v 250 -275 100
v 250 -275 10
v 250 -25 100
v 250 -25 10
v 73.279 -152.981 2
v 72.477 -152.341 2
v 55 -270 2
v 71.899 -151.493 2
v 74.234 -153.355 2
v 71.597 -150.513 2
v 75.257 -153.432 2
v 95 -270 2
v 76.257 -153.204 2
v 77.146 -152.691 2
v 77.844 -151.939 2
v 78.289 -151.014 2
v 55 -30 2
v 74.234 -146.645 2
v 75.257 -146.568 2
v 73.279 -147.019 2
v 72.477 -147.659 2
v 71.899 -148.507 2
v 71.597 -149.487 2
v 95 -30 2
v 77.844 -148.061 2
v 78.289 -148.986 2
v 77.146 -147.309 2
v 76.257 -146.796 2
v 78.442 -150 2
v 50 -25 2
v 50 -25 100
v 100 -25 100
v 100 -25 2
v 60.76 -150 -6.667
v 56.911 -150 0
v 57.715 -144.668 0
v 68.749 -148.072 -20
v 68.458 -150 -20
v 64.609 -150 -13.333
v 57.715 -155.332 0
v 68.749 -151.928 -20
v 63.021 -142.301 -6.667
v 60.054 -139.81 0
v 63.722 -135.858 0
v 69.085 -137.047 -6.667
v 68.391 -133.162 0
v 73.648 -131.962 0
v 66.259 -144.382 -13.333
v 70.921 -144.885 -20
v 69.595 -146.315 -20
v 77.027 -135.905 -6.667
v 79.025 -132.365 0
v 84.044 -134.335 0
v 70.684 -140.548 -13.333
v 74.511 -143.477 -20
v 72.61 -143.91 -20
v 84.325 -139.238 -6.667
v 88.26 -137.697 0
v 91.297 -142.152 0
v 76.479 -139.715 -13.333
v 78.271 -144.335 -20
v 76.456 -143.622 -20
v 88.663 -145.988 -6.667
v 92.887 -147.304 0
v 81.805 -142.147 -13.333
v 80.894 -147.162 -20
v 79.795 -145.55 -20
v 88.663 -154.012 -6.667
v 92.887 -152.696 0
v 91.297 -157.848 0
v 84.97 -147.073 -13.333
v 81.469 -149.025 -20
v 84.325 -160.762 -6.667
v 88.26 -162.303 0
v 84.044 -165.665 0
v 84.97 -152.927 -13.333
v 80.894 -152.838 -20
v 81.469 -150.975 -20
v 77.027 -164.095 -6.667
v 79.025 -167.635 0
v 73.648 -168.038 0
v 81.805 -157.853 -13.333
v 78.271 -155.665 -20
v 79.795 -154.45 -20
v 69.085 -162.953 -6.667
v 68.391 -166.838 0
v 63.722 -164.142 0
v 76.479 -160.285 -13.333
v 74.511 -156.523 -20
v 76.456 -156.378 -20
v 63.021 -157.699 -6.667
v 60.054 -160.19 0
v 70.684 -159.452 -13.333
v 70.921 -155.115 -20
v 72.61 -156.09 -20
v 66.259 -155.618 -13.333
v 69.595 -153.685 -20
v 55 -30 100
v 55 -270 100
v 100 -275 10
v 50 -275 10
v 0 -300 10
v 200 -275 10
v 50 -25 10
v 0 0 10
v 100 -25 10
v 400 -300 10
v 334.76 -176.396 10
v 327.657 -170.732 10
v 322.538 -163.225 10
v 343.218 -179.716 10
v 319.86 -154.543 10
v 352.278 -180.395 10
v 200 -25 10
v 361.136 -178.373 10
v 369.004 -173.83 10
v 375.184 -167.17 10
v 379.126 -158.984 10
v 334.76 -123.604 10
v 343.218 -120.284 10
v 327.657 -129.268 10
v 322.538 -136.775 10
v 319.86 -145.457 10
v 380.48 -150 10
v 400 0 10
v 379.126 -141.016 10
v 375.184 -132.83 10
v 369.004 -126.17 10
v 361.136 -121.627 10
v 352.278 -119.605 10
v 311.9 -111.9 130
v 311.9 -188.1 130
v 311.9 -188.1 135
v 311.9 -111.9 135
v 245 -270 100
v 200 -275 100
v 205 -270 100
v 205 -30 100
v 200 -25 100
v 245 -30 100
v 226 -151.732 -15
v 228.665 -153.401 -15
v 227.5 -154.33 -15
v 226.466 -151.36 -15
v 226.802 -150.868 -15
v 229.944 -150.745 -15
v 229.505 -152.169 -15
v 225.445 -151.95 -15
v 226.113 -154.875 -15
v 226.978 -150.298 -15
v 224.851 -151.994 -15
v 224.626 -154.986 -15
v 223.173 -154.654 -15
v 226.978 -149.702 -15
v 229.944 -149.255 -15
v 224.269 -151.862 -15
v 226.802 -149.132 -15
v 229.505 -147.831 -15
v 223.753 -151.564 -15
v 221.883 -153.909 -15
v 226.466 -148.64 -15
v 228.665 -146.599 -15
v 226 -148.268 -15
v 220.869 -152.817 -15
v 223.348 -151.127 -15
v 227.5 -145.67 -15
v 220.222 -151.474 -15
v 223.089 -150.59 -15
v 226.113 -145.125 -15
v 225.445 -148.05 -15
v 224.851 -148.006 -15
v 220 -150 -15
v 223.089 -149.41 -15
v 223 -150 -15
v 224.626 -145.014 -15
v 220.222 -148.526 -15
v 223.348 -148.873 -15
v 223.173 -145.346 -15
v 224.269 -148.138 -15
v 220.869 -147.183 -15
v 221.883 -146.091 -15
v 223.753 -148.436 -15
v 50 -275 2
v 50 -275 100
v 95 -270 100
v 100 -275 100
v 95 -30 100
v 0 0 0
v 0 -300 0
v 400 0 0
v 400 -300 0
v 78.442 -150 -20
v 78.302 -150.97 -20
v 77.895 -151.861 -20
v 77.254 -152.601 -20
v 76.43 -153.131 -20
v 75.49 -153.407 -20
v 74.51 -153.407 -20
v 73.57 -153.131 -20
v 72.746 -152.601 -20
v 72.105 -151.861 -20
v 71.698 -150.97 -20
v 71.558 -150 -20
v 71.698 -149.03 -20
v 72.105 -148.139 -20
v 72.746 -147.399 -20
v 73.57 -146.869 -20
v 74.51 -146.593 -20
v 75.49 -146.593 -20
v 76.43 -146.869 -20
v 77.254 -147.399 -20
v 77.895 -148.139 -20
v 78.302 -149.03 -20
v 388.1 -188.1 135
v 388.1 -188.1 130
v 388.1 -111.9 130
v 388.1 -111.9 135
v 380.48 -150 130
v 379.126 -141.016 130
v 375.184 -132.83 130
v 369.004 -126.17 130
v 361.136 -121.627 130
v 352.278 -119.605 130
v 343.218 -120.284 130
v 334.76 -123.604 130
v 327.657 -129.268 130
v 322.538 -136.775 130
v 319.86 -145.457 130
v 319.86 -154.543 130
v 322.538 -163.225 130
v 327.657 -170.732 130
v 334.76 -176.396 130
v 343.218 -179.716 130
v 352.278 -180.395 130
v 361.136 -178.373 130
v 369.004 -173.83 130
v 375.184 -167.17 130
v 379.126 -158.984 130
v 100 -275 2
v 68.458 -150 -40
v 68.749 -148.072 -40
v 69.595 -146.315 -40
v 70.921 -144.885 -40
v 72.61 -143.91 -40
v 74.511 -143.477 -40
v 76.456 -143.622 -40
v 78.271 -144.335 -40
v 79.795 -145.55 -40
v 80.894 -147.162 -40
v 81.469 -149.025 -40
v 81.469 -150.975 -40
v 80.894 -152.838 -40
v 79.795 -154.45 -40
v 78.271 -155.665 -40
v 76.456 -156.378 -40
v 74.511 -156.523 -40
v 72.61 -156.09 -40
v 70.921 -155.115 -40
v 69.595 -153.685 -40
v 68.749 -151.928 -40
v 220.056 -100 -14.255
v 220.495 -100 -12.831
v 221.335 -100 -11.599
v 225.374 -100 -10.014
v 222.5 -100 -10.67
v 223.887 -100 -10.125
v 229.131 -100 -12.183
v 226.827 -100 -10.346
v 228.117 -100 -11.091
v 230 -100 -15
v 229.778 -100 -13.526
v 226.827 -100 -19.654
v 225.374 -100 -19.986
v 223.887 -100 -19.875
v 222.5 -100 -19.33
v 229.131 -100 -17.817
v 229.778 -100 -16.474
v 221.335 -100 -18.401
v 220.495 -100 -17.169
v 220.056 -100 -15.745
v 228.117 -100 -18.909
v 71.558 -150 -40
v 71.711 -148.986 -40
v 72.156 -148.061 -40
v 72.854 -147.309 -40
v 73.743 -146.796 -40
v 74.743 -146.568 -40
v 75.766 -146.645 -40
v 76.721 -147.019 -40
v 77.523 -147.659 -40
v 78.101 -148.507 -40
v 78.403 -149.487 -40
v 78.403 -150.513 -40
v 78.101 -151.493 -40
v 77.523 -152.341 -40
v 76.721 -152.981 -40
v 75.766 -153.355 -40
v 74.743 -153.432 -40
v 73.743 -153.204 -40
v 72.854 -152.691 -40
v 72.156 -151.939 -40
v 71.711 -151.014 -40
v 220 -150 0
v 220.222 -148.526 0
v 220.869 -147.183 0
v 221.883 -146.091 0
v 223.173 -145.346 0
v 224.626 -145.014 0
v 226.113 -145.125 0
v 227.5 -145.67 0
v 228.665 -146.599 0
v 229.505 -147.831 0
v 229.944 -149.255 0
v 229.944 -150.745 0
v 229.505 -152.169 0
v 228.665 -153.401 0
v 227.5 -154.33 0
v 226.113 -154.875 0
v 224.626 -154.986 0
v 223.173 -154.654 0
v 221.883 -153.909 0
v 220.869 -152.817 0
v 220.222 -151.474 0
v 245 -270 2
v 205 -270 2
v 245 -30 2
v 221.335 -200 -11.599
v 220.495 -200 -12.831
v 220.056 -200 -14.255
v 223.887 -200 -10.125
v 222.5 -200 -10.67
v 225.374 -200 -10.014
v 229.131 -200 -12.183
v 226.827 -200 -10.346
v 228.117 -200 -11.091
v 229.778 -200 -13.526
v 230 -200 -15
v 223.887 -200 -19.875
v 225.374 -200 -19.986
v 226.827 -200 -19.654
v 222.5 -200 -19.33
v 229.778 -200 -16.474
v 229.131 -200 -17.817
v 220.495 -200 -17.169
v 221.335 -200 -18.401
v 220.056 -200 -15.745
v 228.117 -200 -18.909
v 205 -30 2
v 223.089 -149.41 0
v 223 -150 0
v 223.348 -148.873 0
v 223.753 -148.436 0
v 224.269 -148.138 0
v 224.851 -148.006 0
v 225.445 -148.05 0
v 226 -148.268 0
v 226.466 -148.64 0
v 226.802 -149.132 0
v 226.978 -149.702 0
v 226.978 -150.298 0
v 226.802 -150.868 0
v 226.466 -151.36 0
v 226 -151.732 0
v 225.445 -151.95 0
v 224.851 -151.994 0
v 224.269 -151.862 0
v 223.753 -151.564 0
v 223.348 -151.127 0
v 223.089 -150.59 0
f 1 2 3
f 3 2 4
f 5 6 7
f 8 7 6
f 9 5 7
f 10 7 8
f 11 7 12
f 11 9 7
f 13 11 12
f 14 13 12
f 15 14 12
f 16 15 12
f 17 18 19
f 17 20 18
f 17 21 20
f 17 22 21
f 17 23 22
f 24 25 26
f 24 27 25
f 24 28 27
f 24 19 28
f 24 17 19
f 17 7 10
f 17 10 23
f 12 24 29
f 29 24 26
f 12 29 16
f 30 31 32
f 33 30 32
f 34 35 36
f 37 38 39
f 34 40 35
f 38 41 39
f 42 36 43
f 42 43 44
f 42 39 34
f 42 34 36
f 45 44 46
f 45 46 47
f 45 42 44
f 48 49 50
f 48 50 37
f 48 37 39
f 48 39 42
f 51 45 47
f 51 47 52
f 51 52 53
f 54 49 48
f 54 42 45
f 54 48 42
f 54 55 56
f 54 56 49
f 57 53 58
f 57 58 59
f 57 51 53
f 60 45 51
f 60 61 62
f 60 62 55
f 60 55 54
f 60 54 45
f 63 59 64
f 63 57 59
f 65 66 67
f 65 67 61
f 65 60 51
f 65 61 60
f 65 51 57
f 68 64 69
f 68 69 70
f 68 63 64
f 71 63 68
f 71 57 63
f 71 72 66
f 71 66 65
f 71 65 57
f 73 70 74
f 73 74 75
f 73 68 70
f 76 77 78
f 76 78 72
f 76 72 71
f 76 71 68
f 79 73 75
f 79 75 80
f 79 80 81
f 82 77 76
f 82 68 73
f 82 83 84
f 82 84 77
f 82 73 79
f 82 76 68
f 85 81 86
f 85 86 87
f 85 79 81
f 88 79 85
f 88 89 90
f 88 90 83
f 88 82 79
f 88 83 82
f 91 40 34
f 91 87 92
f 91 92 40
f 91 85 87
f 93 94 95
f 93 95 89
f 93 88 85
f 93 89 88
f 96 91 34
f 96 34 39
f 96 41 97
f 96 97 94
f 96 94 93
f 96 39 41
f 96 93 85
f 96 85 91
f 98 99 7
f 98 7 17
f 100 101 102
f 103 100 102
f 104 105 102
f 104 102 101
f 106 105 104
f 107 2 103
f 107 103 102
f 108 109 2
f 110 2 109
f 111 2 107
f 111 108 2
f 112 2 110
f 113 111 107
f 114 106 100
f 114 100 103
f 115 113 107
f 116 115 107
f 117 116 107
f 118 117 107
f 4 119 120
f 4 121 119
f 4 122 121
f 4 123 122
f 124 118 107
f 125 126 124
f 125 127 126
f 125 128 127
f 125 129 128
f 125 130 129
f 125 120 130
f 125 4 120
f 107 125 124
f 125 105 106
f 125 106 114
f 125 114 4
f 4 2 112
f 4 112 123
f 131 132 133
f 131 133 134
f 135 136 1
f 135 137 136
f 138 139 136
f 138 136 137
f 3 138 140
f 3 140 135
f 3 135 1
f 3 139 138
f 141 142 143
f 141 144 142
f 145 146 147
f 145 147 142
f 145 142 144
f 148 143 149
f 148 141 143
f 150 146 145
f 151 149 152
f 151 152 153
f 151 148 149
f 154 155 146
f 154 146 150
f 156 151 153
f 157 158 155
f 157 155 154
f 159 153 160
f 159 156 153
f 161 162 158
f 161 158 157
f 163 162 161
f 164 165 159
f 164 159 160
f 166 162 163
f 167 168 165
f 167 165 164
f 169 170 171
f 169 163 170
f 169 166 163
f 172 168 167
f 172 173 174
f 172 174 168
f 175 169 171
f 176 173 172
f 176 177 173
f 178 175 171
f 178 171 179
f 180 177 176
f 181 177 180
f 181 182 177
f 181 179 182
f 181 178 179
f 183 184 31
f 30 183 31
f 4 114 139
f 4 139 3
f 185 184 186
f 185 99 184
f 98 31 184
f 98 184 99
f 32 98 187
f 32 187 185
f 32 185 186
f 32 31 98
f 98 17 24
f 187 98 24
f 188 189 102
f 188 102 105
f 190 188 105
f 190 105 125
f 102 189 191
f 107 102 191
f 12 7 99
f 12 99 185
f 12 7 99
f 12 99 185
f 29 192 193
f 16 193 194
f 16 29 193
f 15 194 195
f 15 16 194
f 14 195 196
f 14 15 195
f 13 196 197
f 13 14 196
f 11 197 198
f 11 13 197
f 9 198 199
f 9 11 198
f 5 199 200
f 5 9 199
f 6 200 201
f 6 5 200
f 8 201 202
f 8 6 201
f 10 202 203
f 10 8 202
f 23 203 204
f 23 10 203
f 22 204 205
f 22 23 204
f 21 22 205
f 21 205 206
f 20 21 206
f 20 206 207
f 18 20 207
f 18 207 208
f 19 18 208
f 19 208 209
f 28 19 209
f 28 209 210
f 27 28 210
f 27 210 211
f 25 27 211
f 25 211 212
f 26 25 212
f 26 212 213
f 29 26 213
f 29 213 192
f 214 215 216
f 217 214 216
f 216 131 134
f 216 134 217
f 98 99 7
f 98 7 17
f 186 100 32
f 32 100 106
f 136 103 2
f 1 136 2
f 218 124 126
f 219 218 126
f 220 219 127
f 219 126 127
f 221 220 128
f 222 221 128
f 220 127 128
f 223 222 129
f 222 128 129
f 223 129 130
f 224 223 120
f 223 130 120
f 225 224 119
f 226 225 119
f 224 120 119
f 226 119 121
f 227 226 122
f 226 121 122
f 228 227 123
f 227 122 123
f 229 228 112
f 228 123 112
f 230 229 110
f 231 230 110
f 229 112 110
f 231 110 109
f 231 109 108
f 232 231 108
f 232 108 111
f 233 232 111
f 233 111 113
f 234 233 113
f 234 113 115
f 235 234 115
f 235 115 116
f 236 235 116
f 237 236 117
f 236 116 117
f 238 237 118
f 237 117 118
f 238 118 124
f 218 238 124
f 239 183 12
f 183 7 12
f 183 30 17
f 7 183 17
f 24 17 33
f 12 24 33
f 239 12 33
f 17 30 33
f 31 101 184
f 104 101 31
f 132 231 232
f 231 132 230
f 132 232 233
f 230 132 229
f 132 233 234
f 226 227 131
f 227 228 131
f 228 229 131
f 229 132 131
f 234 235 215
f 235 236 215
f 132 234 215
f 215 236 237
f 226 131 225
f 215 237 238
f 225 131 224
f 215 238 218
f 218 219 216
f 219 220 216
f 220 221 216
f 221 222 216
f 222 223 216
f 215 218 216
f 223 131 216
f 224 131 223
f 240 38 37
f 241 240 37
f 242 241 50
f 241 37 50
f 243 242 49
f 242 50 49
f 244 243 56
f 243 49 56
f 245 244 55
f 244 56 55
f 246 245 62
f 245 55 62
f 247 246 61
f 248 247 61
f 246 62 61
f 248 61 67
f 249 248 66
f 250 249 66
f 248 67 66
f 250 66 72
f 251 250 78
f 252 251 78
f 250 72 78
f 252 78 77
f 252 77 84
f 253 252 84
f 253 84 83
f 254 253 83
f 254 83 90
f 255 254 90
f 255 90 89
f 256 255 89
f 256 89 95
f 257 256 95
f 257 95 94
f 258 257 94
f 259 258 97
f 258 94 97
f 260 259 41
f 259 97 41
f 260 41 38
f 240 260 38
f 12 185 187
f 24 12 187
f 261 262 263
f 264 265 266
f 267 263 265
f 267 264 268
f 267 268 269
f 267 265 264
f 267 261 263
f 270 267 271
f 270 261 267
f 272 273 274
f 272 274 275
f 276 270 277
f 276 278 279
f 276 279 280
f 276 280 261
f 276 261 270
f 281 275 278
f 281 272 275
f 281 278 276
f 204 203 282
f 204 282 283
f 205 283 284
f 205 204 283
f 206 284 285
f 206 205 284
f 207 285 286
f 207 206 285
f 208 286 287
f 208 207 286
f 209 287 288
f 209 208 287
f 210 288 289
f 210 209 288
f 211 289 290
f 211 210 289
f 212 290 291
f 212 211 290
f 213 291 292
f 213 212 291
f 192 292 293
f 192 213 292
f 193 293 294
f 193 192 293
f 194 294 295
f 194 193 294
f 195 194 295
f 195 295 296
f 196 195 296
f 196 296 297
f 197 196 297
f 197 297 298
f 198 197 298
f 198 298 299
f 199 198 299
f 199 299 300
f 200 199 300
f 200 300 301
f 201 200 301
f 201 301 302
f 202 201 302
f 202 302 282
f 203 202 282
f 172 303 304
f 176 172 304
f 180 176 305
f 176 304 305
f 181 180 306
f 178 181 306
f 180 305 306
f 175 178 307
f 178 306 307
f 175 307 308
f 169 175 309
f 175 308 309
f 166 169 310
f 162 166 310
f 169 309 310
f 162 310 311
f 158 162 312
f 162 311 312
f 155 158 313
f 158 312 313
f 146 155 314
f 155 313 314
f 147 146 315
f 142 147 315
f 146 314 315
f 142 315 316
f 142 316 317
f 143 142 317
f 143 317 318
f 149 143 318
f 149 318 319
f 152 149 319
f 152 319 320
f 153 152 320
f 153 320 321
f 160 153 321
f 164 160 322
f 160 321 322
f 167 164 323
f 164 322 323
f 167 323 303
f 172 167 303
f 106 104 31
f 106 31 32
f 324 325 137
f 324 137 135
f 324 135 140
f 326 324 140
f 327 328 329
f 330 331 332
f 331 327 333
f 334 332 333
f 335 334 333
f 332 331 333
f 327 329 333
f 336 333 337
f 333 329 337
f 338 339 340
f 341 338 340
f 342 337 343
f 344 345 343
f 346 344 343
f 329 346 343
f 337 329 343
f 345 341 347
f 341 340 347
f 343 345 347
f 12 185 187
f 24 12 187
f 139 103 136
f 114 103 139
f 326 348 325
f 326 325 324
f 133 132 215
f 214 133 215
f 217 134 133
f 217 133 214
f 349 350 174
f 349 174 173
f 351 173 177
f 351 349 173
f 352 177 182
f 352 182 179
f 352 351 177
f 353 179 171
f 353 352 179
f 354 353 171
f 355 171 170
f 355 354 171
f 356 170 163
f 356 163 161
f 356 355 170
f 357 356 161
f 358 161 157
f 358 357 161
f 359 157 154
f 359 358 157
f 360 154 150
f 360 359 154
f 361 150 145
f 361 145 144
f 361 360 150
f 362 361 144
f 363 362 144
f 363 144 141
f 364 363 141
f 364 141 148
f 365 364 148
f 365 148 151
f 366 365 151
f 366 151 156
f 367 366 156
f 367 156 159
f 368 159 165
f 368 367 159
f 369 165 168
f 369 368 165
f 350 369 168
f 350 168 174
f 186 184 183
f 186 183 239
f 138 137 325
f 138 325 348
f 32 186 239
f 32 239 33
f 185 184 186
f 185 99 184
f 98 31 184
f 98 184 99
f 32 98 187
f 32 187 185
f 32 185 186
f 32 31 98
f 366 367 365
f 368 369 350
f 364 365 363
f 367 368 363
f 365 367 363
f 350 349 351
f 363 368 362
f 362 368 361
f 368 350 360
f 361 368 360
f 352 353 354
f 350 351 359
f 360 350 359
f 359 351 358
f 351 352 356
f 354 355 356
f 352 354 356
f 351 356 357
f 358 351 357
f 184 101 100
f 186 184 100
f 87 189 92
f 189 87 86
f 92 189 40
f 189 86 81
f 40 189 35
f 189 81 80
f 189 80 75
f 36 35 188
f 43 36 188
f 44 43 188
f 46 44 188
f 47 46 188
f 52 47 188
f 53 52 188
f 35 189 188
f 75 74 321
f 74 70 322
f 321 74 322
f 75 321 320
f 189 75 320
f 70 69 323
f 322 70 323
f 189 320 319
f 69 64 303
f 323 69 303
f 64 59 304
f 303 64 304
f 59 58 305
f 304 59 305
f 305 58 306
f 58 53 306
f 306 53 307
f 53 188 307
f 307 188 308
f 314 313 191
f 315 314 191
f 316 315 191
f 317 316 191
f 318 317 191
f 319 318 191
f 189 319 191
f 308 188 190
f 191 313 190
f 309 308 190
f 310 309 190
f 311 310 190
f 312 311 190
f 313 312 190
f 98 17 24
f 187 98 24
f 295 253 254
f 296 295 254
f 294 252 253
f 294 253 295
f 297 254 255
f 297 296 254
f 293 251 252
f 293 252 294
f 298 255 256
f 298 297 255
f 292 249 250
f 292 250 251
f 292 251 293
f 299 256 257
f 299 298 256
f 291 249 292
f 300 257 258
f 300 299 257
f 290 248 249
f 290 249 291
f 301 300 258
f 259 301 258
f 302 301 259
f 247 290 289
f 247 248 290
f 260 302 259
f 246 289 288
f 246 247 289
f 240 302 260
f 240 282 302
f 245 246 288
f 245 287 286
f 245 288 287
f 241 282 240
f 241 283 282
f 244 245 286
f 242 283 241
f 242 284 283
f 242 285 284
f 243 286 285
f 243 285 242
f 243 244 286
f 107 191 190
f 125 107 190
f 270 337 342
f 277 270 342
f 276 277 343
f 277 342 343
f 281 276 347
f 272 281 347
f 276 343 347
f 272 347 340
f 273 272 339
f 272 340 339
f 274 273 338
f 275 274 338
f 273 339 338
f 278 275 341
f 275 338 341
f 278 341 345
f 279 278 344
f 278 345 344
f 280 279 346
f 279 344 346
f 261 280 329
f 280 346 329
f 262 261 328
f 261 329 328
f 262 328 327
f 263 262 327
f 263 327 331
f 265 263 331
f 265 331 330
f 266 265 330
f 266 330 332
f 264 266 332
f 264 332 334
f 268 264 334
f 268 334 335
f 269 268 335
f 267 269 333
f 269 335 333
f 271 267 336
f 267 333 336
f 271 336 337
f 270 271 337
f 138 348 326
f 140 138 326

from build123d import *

# Parameters (mm, degrees)
SKETCH2_W                = 400
SKETCH2_H                = 300
BOSS_EXTRUDE1_DEPTH      = 10
SKETCH3_W                = 50
SKETCH3_H                = 250
BOSS_EXTRUDE2_DEPTH      = 100
SKETCH7_W                = 50
SKETCH7_H                = 250
BOSS_EXTRUDE3_DEPTH      = 98
SKETCH9_W                = 40
SKETCH9_H                = 240
CUT_EXTRUDE2_DEPTH       = 98
SKETCH11_W               = 40
SKETCH11_H               = 240
CUT_EXTRUDE3_DEPTH       = 98
SKETCH12_R               = 30.48
BOSS_EXTRUDE4_DEPTH      = 120
SKETCH13_W               = 76.2
SKETCH13_H               = 76.2
BOSS_EXTRUDE5_DEPTH      = 5
SKETCH14_R               = 18.088772669
BOSS_EXTRUDE6_DEPTH      = 20
BOSS_EXTRUDE6_TAPER      = 30
SKETCH20_R               = 6.541767286
SKETCH20_R_2             = 3.441767286
EXTRUDE_THIN2_DEPTH      = 20
CUT_EXTRUDE6_START       = -30
SKETCH22_R               = 3.441767286
CUT_EXTRUDE6_DEPTH       = 30
SKETCH23_R               = 5
SKETCH23_R_2             = 2
EXTRUDE_THIN3_DEPTH      = 15
BOSS_EXTRUDE11_START     = -200
BOSS_EXTRUDE11_OUTLINE_R = 5
BOSS_EXTRUDE11_DEPTH     = 100


# Read off the part's stored shape, not the designer's step: Boss-Extrude11
with BuildPart() as part:
    # Sketch2 → Boss-Extrude1 (new body)
    with BuildSketch(Plane.XY):
        with Locations((200, -150)):
            Rectangle(SKETCH2_W, SKETCH2_H)
    extrude(amount=BOSS_EXTRUDE1_DEPTH)

    # Sketch3 → Boss-Extrude2 (add)
    with BuildSketch(Plane.XY):
        with Locations((75, -150)):
            Rectangle(SKETCH3_W, SKETCH3_H)
        with Locations((225, -150)):
            Rectangle(SKETCH3_W, SKETCH3_H)
    extrude(amount=BOSS_EXTRUDE2_DEPTH)


with BuildPart() as body_2:
    # Sketch7 → Boss-Extrude3 (new body)
    with BuildSketch(Plane.XY.offset(100)):
        with Locations((75, -150)):
            Rectangle(SKETCH7_W, SKETCH7_H)
    extrude(amount=-BOSS_EXTRUDE3_DEPTH)


with BuildPart() as cut_extrude2_tool:
    # Sketch9 → Cut-Extrude2 (new body)
    with BuildSketch(Plane.XY.offset(100)):
        with Locations((75, -150)):
            Rectangle(SKETCH9_W, SKETCH9_H)
    extrude(amount=-CUT_EXTRUDE2_DEPTH)


with BuildPart() as part_1:
    add(part.part)

    # Cut-Extrude2: cut by cut_extrude2_tool
    add(cut_extrude2_tool.part, mode=Mode.SUBTRACT)

    # Sketch11 → Cut-Extrude3 (cut)
    with BuildSketch(Plane.XY.offset(100)):
        with Locations((225, -150)):
            Rectangle(SKETCH11_W, SKETCH11_H)
    extrude(amount=-CUT_EXTRUDE3_DEPTH, mode=Mode.SUBTRACT)

    # Sketch12 → Boss-Extrude4 (add)
    with BuildSketch(Plane.XY.offset(10)):
        with Locations((350, -150)):
            Circle(SKETCH12_R)
    extrude(amount=BOSS_EXTRUDE4_DEPTH)

    # Sketch13 → Boss-Extrude5 (add)
    with BuildSketch(Plane.XY.offset(130)):
        with Locations((350, -150)):
            Rectangle(SKETCH13_W, SKETCH13_H)
    extrude(amount=BOSS_EXTRUDE5_DEPTH)

    # Sketch14 → Boss-Extrude6 (add)
    with BuildSketch(Plane(origin=(0, 0, 0), x_dir=(-1, 0, 0), z_dir=(0, 0, -1))):
        with Locations((-75, -150)):
            Circle(SKETCH14_R)
    extrude(amount=BOSS_EXTRUDE6_DEPTH, taper=BOSS_EXTRUDE6_TAPER)

    # Sketch20 → Extrude-Thin2 (add)
    with BuildSketch(Plane(origin=(0, 0, -20), x_dir=(-1, 0, 0), z_dir=(0, 0, -1))):
        with Locations((-75, -150)):
            Circle(SKETCH20_R)
        with Locations((-75, -150)):
            Circle(SKETCH20_R_2, mode=Mode.SUBTRACT)
    extrude(amount=EXTRUDE_THIN2_DEPTH)

    # Sketch22 → Cut-Extrude6 (cut)
    with BuildSketch(Plane(origin=(0, 0, -20), x_dir=(-1, 0, 0), z_dir=(0, 0, -1)).offset(CUT_EXTRUDE6_START)):
        with Locations(Location((-75, -150, 0), (0, 0, 180))):
            Circle(SKETCH22_R)
    extrude(amount=CUT_EXTRUDE6_DEPTH, mode=Mode.SUBTRACT)

    # Sketch23 → Extrude-Thin3 (add)
    with BuildSketch(Plane(origin=(0, 0, 0), x_dir=(-1, 0, 0), z_dir=(0, 0, -1))):
        with Locations((-225, -150)):
            Circle(SKETCH23_R)
        with Locations((-225, -150)):
            Circle(SKETCH23_R_2, mode=Mode.SUBTRACT)
    extrude(amount=EXTRUDE_THIN3_DEPTH)


with BuildPart() as body_2_1:
    add(body_2.part)

    # Cut-Extrude2: cut by cut_extrude2_tool
    add(cut_extrude2_tool.part, mode=Mode.SUBTRACT)


with BuildPart() as body_3:
    # Boss-Extrude11 outline → Boss-Extrude11 (new body)
    with BuildSketch(Plane(origin=(0, 0, 0), x_dir=(1, 0, 0), z_dir=(0, 1, 0)).offset(BOSS_EXTRUDE11_START)):
        with Locations((225, 15)):
            Circle(BOSS_EXTRUDE11_OUTLINE_R)
    extrude(amount=BOSS_EXTRUDE11_DEPTH)


solid = Compound([part_1.part, body_2_1.part, body_3.part])
